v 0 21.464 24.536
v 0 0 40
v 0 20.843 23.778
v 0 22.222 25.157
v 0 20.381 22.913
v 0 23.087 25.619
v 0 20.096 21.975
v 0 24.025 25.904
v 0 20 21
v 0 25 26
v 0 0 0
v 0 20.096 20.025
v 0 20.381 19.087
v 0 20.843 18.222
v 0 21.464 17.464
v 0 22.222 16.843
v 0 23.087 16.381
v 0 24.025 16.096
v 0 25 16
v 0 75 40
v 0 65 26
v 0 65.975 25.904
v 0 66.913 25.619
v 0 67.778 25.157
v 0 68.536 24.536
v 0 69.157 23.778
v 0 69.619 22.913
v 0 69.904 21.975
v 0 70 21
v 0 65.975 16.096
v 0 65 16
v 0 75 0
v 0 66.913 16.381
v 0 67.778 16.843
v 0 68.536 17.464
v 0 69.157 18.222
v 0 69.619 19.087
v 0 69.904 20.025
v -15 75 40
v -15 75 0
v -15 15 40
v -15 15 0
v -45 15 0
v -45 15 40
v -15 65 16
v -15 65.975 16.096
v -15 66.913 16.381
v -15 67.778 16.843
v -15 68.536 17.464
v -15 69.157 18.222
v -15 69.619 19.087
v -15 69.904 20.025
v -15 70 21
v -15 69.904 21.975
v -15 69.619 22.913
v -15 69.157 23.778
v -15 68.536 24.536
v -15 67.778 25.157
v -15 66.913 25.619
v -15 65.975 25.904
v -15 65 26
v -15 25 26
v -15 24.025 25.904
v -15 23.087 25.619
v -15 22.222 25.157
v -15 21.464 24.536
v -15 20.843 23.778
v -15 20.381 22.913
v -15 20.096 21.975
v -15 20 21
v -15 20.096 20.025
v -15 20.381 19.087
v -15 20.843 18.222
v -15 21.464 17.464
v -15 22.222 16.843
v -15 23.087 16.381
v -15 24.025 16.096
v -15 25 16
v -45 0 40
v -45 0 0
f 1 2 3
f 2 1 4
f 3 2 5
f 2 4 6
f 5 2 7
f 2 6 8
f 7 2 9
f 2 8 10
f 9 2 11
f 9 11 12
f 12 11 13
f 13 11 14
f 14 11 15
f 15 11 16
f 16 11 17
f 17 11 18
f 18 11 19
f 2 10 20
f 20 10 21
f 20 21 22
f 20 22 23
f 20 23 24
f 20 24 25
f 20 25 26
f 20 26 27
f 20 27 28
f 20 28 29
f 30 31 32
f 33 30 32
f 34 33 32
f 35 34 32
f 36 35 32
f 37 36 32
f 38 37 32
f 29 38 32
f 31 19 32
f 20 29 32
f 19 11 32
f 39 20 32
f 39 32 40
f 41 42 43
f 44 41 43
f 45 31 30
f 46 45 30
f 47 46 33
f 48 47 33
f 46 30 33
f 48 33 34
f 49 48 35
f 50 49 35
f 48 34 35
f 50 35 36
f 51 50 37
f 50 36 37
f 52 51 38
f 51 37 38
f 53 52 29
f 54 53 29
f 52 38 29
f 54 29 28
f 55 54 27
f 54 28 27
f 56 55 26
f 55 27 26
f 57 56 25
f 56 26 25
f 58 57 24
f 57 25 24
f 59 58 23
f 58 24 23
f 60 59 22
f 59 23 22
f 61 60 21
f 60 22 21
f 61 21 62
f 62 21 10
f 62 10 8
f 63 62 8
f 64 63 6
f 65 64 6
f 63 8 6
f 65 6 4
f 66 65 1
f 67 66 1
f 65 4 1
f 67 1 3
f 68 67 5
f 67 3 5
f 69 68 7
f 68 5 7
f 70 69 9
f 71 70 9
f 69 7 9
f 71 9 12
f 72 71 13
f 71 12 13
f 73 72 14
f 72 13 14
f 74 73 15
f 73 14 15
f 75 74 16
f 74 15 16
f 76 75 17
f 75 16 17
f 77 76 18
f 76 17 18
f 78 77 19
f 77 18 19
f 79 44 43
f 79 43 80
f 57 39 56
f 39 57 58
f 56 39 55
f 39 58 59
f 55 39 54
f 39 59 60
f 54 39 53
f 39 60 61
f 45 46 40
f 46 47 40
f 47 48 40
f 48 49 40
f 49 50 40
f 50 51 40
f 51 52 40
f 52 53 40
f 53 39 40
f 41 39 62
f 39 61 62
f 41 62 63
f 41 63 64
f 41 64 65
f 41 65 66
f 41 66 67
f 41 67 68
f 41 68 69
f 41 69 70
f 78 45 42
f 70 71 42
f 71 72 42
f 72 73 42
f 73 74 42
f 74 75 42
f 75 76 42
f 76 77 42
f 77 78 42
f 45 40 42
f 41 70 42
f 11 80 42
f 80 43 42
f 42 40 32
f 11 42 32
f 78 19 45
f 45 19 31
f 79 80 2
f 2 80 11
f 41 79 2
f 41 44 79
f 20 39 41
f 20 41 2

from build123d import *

# Parameters (mm, degrees)
F1_DEPTH = 40
F3_DEPTH = 45.001


with BuildPart() as f1:
    # F0 (on Top) → F1 (new body)
    with BuildSketch(Plane.XY):
        Polygon((-45, 0), (0, 0), (0, 75), (-15, 75), (-15, 15), (-45, 15), align=None)
    extrude(amount=F1_DEPTH)

    # F2 (on face) → F3 (cut, through all)
    with BuildSketch(Plane.YZ):
        with BuildLine():
            Line((65, 26.000001), (25, 26.000001))
            ThreePointArc((25, 26.000001), (20, 21.000001), (25, 16.000001))
            Line((25, 16.000001), (65, 16.000001))
            ThreePointArc((65, 16.000001), (70, 21.000001), (65, 26.000001))
        make_face()
    extrude(amount=-F3_DEPTH, mode=Mode.SUBTRACT)


solid = f1.part
